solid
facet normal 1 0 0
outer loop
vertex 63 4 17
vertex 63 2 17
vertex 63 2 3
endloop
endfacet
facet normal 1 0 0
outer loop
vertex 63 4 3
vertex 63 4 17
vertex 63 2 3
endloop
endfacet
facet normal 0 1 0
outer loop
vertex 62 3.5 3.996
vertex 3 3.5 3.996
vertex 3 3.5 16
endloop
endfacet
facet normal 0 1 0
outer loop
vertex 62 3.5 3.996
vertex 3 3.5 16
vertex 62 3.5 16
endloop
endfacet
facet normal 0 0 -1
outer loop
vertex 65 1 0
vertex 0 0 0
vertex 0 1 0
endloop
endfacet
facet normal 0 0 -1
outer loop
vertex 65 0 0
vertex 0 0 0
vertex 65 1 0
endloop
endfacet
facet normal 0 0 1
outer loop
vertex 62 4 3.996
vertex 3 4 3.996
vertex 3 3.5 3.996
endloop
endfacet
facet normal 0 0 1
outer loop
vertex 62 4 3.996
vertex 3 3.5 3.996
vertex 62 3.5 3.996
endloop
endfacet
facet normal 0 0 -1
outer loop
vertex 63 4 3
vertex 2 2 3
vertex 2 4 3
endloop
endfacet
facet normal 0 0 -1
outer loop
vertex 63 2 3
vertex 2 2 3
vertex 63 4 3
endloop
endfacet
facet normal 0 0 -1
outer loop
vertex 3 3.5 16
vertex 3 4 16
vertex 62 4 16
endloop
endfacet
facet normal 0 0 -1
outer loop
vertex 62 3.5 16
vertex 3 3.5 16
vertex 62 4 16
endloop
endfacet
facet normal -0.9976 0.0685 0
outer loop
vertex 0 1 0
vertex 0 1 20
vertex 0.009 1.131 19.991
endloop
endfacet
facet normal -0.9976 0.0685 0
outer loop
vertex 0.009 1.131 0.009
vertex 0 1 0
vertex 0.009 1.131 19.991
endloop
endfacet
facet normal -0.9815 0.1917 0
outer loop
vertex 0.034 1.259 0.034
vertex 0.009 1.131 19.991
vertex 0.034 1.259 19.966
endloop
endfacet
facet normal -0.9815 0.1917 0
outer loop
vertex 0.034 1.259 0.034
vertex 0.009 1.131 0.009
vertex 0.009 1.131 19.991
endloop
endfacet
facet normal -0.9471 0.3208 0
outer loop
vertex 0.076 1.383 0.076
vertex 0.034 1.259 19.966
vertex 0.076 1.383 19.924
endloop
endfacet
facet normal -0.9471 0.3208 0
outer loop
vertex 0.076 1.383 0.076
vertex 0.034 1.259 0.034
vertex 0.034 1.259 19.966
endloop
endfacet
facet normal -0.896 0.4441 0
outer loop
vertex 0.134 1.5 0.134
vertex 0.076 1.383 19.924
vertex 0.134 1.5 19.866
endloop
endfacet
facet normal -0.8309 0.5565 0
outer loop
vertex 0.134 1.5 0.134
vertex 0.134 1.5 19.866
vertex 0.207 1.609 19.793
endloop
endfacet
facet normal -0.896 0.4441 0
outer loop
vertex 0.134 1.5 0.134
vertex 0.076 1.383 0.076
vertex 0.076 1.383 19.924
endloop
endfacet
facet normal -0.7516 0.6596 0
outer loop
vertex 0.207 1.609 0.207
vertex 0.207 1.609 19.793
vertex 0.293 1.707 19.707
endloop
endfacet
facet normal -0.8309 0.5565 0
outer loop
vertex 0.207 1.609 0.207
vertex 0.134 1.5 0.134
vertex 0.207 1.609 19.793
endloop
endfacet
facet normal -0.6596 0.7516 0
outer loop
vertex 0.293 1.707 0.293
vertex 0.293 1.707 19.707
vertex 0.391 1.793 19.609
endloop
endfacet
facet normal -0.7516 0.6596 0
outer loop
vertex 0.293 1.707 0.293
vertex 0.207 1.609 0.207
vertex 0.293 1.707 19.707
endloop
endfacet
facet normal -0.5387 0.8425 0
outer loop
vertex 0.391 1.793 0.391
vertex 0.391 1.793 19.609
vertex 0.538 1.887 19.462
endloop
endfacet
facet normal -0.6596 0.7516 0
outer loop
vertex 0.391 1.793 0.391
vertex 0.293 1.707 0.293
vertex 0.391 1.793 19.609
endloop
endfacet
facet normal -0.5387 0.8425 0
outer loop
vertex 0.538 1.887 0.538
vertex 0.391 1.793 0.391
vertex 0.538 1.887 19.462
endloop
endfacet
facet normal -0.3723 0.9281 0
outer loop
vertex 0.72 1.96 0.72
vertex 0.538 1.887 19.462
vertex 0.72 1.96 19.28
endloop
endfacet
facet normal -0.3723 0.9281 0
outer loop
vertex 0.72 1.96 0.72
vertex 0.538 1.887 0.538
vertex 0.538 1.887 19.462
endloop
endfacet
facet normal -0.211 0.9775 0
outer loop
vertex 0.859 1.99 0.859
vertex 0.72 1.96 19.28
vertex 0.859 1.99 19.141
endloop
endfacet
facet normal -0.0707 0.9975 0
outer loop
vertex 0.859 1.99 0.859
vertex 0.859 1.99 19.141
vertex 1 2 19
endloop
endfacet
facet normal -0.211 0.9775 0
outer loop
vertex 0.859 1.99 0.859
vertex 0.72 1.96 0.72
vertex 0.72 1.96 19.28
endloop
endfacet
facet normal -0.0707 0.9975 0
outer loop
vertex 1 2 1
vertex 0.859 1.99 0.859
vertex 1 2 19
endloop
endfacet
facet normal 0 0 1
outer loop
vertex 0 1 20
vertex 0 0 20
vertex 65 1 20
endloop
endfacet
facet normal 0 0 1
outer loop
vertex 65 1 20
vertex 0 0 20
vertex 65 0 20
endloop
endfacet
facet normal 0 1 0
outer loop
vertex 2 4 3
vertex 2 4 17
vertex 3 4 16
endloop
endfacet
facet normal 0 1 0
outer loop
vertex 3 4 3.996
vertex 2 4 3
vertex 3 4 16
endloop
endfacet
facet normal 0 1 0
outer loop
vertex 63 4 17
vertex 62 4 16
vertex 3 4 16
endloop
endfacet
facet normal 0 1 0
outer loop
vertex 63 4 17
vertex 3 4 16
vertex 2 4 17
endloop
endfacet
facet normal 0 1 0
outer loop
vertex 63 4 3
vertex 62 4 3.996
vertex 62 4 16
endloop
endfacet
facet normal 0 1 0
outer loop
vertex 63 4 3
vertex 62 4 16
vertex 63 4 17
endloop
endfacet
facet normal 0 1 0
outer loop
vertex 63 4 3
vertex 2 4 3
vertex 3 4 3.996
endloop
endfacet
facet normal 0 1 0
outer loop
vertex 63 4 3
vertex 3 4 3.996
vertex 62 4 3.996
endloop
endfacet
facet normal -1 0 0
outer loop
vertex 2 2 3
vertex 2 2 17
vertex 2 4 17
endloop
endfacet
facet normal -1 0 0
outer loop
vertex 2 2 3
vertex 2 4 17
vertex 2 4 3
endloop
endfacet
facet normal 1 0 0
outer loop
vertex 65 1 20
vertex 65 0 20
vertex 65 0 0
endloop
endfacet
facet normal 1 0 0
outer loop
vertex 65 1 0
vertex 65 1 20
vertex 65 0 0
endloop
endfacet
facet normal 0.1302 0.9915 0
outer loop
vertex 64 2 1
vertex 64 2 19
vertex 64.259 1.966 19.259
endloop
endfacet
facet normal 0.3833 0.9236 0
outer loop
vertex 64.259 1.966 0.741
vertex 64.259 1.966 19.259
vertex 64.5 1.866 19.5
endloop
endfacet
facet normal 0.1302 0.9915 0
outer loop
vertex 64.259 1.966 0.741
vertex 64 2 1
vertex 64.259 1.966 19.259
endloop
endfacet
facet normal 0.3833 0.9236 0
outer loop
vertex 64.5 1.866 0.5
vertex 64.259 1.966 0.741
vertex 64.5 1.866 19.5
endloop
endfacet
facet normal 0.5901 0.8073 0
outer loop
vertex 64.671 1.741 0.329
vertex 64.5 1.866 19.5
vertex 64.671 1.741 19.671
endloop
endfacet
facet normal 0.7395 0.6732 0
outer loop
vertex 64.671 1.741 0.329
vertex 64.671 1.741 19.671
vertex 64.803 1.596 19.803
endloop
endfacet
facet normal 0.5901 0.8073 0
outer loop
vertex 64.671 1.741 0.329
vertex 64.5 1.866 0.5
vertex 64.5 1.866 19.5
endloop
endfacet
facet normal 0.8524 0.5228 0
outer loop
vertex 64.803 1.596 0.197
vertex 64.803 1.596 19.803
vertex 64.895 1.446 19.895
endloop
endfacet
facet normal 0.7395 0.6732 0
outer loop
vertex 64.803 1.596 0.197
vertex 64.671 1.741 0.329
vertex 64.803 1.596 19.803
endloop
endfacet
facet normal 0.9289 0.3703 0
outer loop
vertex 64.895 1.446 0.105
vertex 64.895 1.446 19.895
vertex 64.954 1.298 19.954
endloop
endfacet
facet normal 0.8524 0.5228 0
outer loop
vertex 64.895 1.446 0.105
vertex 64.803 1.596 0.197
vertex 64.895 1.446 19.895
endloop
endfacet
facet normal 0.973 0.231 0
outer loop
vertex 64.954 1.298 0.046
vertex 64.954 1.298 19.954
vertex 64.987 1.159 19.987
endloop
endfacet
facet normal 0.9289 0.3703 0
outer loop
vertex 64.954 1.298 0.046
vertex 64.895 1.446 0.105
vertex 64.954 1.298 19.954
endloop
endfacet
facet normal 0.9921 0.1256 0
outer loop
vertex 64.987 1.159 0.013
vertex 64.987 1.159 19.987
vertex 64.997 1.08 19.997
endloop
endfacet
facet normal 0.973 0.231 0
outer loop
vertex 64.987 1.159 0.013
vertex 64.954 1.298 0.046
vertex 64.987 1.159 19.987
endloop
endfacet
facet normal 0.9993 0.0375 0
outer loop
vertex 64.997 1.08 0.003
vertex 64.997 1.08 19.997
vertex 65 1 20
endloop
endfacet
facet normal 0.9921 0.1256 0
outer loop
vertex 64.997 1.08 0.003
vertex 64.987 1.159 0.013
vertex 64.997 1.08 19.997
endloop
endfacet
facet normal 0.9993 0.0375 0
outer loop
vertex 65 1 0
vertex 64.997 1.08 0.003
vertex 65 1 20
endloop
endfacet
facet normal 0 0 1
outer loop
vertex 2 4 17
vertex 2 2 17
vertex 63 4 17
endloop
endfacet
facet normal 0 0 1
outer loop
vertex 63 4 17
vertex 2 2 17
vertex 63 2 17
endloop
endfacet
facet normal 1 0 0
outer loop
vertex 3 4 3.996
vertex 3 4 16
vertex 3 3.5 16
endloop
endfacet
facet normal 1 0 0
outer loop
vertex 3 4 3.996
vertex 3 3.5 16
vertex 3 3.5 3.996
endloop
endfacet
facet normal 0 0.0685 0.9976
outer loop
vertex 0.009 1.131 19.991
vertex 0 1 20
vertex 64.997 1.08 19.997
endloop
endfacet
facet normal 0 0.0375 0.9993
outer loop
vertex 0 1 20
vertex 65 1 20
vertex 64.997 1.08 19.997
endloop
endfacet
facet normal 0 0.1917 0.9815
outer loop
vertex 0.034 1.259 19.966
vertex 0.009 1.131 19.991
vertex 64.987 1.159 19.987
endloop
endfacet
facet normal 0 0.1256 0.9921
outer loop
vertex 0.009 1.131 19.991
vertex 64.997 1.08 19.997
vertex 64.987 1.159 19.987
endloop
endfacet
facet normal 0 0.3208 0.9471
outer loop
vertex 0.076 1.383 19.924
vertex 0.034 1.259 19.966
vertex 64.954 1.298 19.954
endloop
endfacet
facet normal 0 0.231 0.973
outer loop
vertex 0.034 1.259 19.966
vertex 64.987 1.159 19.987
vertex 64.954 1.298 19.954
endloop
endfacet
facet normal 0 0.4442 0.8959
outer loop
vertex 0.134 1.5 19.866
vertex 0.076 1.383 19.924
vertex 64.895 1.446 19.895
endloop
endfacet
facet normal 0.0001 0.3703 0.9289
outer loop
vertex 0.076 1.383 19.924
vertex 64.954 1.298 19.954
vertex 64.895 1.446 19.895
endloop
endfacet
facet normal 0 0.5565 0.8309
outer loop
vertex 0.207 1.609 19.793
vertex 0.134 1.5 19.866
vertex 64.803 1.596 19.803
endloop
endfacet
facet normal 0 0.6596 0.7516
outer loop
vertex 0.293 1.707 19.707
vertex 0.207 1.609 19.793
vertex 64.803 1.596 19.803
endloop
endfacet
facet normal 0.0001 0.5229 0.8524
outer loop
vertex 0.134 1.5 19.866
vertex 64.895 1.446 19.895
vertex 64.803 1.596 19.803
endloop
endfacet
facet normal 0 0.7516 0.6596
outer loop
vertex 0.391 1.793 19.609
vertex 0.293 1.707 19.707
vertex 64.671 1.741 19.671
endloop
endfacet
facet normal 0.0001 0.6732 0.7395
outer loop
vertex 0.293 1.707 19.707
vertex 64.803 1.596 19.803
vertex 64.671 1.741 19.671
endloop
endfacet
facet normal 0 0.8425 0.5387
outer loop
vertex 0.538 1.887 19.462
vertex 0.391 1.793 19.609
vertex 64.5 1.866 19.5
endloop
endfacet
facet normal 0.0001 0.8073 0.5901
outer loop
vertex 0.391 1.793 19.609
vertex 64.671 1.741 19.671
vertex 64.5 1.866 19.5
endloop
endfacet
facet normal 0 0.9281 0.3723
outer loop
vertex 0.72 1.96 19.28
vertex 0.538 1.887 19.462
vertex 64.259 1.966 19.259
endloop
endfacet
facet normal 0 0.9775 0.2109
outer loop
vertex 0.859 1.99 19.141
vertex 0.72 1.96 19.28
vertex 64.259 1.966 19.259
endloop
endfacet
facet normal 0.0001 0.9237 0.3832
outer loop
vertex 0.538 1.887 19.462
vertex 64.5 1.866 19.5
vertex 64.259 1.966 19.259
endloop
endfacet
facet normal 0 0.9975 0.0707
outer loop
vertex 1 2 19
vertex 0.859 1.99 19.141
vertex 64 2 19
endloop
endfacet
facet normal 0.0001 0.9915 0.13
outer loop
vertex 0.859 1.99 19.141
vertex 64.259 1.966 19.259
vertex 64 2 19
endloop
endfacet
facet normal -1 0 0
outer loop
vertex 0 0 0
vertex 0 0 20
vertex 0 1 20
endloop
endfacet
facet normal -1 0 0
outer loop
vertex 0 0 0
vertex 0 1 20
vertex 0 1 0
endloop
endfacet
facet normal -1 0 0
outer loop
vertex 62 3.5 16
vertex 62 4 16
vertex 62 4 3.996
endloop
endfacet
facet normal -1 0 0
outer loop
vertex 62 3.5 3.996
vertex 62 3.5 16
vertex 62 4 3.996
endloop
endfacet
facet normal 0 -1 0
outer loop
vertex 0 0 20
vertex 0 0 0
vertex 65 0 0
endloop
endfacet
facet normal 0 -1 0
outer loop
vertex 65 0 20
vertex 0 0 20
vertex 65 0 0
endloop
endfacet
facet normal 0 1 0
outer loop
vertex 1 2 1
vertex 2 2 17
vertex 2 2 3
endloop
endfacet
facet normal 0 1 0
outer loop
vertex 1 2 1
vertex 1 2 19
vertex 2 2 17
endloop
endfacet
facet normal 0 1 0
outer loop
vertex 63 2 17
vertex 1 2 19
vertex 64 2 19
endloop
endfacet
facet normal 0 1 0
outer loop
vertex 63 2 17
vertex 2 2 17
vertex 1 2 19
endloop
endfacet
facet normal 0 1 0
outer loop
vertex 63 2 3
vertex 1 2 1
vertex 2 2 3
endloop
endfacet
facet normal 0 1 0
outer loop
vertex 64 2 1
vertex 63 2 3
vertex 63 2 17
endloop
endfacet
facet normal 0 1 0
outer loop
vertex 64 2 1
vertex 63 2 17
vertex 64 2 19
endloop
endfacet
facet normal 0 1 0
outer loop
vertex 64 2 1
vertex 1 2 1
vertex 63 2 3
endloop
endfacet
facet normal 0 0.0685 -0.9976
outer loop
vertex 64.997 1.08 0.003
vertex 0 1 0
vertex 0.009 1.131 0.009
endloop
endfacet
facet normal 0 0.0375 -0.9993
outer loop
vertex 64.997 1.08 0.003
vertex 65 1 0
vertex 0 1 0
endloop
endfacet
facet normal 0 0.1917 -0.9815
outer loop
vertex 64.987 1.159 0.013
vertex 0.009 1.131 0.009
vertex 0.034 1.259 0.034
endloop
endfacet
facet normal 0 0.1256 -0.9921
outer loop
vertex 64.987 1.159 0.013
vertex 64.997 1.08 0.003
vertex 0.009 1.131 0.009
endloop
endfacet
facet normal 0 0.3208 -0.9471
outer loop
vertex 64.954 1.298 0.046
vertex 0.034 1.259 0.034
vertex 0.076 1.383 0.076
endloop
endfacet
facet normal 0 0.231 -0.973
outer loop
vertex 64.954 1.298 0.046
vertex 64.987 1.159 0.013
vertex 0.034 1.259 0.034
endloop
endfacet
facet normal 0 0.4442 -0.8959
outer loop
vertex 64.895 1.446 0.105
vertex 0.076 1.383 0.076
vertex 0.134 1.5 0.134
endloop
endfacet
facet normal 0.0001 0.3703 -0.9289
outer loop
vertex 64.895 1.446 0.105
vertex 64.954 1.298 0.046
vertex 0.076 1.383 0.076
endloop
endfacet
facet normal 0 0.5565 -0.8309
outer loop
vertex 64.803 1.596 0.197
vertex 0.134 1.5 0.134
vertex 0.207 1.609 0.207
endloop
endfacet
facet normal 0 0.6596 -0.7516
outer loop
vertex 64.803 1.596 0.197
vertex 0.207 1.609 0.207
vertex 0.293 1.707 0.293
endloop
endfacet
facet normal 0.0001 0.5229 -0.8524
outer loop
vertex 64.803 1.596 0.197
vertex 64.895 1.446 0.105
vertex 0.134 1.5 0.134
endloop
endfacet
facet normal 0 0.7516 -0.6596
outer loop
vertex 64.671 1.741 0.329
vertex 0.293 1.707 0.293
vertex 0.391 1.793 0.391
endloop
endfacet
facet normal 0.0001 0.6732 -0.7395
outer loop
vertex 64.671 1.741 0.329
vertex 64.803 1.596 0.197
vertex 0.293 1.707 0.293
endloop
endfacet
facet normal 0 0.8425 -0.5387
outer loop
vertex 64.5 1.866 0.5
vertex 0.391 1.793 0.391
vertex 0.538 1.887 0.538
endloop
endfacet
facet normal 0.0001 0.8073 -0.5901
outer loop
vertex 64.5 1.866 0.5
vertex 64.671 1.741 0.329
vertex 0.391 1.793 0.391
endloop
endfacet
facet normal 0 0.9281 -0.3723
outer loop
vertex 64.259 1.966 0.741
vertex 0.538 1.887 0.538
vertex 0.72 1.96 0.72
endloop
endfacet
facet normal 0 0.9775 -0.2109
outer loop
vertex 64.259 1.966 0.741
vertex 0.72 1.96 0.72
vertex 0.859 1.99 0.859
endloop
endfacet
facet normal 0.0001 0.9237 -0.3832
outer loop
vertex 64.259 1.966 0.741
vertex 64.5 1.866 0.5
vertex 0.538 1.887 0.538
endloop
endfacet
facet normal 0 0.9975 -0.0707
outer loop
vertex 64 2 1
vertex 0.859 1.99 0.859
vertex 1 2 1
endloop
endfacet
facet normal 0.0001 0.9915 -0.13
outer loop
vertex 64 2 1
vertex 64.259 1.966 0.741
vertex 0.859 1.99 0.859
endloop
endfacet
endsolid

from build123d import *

# Parameters (mm, degrees)
ESBO_O1_W                = 65
ESBO_O1_H                = 20
RESSALTO_EXTRUS_O1_DEPTH = 2
ESBO_O2_W                = 61
ESBO_O2_H                = 14
RESSALTO_EXTRUS_O2_DEPTH = 2
ESBO_O3_W                = 59
ESBO_O3_H                = 12.003847287
CORTE_EXTRUS_O1_DEPTH    = 0.5
FILETE1_R                = 1


with BuildPart() as part:
    # Esboço1 → Ressalto-extrusão1 (new body)
    with BuildSketch(Plane(origin=(0, 0, 0), x_dir=(1, 0, 0), z_dir=(0, 1, 0))):
        with Locations((32.5, -10)):
            Rectangle(ESBO_O1_W, ESBO_O1_H)
    extrude(amount=RESSALTO_EXTRUS_O1_DEPTH)

    # Esboço2 → Ressalto-extrusão2 (add)
    with BuildSketch(Plane(origin=(0, 2, 0), x_dir=(1, 0, 0), z_dir=(0, 1, 0))):
        with Locations((32.5, -10)):
            Rectangle(ESBO_O2_W, ESBO_O2_H)
    extrude(amount=RESSALTO_EXTRUS_O2_DEPTH)

    # Esboço3 → Corte-extrusão1 (cut)
    with BuildSketch(Plane(origin=(0, 4, 0), x_dir=(1, 0, 0), z_dir=(0, 1, 0))):
        with Locations((32.5, -9.998076357)):
            Rectangle(ESBO_O3_W, ESBO_O3_H)
    extrude(amount=-CORTE_EXTRUS_O1_DEPTH, mode=Mode.SUBTRACT)

    # Filete1
    filete1_edges = [part.edges().sort_by_distance(p)[0] for p in [
        (65, 2, 10),
        (32.5, 2, 0),
        (0, 2, 10),
        (32.5, 2, 20),
    ]]
    fillet(filete1_edges, radius=FILETE1_R)


solid = part.part
